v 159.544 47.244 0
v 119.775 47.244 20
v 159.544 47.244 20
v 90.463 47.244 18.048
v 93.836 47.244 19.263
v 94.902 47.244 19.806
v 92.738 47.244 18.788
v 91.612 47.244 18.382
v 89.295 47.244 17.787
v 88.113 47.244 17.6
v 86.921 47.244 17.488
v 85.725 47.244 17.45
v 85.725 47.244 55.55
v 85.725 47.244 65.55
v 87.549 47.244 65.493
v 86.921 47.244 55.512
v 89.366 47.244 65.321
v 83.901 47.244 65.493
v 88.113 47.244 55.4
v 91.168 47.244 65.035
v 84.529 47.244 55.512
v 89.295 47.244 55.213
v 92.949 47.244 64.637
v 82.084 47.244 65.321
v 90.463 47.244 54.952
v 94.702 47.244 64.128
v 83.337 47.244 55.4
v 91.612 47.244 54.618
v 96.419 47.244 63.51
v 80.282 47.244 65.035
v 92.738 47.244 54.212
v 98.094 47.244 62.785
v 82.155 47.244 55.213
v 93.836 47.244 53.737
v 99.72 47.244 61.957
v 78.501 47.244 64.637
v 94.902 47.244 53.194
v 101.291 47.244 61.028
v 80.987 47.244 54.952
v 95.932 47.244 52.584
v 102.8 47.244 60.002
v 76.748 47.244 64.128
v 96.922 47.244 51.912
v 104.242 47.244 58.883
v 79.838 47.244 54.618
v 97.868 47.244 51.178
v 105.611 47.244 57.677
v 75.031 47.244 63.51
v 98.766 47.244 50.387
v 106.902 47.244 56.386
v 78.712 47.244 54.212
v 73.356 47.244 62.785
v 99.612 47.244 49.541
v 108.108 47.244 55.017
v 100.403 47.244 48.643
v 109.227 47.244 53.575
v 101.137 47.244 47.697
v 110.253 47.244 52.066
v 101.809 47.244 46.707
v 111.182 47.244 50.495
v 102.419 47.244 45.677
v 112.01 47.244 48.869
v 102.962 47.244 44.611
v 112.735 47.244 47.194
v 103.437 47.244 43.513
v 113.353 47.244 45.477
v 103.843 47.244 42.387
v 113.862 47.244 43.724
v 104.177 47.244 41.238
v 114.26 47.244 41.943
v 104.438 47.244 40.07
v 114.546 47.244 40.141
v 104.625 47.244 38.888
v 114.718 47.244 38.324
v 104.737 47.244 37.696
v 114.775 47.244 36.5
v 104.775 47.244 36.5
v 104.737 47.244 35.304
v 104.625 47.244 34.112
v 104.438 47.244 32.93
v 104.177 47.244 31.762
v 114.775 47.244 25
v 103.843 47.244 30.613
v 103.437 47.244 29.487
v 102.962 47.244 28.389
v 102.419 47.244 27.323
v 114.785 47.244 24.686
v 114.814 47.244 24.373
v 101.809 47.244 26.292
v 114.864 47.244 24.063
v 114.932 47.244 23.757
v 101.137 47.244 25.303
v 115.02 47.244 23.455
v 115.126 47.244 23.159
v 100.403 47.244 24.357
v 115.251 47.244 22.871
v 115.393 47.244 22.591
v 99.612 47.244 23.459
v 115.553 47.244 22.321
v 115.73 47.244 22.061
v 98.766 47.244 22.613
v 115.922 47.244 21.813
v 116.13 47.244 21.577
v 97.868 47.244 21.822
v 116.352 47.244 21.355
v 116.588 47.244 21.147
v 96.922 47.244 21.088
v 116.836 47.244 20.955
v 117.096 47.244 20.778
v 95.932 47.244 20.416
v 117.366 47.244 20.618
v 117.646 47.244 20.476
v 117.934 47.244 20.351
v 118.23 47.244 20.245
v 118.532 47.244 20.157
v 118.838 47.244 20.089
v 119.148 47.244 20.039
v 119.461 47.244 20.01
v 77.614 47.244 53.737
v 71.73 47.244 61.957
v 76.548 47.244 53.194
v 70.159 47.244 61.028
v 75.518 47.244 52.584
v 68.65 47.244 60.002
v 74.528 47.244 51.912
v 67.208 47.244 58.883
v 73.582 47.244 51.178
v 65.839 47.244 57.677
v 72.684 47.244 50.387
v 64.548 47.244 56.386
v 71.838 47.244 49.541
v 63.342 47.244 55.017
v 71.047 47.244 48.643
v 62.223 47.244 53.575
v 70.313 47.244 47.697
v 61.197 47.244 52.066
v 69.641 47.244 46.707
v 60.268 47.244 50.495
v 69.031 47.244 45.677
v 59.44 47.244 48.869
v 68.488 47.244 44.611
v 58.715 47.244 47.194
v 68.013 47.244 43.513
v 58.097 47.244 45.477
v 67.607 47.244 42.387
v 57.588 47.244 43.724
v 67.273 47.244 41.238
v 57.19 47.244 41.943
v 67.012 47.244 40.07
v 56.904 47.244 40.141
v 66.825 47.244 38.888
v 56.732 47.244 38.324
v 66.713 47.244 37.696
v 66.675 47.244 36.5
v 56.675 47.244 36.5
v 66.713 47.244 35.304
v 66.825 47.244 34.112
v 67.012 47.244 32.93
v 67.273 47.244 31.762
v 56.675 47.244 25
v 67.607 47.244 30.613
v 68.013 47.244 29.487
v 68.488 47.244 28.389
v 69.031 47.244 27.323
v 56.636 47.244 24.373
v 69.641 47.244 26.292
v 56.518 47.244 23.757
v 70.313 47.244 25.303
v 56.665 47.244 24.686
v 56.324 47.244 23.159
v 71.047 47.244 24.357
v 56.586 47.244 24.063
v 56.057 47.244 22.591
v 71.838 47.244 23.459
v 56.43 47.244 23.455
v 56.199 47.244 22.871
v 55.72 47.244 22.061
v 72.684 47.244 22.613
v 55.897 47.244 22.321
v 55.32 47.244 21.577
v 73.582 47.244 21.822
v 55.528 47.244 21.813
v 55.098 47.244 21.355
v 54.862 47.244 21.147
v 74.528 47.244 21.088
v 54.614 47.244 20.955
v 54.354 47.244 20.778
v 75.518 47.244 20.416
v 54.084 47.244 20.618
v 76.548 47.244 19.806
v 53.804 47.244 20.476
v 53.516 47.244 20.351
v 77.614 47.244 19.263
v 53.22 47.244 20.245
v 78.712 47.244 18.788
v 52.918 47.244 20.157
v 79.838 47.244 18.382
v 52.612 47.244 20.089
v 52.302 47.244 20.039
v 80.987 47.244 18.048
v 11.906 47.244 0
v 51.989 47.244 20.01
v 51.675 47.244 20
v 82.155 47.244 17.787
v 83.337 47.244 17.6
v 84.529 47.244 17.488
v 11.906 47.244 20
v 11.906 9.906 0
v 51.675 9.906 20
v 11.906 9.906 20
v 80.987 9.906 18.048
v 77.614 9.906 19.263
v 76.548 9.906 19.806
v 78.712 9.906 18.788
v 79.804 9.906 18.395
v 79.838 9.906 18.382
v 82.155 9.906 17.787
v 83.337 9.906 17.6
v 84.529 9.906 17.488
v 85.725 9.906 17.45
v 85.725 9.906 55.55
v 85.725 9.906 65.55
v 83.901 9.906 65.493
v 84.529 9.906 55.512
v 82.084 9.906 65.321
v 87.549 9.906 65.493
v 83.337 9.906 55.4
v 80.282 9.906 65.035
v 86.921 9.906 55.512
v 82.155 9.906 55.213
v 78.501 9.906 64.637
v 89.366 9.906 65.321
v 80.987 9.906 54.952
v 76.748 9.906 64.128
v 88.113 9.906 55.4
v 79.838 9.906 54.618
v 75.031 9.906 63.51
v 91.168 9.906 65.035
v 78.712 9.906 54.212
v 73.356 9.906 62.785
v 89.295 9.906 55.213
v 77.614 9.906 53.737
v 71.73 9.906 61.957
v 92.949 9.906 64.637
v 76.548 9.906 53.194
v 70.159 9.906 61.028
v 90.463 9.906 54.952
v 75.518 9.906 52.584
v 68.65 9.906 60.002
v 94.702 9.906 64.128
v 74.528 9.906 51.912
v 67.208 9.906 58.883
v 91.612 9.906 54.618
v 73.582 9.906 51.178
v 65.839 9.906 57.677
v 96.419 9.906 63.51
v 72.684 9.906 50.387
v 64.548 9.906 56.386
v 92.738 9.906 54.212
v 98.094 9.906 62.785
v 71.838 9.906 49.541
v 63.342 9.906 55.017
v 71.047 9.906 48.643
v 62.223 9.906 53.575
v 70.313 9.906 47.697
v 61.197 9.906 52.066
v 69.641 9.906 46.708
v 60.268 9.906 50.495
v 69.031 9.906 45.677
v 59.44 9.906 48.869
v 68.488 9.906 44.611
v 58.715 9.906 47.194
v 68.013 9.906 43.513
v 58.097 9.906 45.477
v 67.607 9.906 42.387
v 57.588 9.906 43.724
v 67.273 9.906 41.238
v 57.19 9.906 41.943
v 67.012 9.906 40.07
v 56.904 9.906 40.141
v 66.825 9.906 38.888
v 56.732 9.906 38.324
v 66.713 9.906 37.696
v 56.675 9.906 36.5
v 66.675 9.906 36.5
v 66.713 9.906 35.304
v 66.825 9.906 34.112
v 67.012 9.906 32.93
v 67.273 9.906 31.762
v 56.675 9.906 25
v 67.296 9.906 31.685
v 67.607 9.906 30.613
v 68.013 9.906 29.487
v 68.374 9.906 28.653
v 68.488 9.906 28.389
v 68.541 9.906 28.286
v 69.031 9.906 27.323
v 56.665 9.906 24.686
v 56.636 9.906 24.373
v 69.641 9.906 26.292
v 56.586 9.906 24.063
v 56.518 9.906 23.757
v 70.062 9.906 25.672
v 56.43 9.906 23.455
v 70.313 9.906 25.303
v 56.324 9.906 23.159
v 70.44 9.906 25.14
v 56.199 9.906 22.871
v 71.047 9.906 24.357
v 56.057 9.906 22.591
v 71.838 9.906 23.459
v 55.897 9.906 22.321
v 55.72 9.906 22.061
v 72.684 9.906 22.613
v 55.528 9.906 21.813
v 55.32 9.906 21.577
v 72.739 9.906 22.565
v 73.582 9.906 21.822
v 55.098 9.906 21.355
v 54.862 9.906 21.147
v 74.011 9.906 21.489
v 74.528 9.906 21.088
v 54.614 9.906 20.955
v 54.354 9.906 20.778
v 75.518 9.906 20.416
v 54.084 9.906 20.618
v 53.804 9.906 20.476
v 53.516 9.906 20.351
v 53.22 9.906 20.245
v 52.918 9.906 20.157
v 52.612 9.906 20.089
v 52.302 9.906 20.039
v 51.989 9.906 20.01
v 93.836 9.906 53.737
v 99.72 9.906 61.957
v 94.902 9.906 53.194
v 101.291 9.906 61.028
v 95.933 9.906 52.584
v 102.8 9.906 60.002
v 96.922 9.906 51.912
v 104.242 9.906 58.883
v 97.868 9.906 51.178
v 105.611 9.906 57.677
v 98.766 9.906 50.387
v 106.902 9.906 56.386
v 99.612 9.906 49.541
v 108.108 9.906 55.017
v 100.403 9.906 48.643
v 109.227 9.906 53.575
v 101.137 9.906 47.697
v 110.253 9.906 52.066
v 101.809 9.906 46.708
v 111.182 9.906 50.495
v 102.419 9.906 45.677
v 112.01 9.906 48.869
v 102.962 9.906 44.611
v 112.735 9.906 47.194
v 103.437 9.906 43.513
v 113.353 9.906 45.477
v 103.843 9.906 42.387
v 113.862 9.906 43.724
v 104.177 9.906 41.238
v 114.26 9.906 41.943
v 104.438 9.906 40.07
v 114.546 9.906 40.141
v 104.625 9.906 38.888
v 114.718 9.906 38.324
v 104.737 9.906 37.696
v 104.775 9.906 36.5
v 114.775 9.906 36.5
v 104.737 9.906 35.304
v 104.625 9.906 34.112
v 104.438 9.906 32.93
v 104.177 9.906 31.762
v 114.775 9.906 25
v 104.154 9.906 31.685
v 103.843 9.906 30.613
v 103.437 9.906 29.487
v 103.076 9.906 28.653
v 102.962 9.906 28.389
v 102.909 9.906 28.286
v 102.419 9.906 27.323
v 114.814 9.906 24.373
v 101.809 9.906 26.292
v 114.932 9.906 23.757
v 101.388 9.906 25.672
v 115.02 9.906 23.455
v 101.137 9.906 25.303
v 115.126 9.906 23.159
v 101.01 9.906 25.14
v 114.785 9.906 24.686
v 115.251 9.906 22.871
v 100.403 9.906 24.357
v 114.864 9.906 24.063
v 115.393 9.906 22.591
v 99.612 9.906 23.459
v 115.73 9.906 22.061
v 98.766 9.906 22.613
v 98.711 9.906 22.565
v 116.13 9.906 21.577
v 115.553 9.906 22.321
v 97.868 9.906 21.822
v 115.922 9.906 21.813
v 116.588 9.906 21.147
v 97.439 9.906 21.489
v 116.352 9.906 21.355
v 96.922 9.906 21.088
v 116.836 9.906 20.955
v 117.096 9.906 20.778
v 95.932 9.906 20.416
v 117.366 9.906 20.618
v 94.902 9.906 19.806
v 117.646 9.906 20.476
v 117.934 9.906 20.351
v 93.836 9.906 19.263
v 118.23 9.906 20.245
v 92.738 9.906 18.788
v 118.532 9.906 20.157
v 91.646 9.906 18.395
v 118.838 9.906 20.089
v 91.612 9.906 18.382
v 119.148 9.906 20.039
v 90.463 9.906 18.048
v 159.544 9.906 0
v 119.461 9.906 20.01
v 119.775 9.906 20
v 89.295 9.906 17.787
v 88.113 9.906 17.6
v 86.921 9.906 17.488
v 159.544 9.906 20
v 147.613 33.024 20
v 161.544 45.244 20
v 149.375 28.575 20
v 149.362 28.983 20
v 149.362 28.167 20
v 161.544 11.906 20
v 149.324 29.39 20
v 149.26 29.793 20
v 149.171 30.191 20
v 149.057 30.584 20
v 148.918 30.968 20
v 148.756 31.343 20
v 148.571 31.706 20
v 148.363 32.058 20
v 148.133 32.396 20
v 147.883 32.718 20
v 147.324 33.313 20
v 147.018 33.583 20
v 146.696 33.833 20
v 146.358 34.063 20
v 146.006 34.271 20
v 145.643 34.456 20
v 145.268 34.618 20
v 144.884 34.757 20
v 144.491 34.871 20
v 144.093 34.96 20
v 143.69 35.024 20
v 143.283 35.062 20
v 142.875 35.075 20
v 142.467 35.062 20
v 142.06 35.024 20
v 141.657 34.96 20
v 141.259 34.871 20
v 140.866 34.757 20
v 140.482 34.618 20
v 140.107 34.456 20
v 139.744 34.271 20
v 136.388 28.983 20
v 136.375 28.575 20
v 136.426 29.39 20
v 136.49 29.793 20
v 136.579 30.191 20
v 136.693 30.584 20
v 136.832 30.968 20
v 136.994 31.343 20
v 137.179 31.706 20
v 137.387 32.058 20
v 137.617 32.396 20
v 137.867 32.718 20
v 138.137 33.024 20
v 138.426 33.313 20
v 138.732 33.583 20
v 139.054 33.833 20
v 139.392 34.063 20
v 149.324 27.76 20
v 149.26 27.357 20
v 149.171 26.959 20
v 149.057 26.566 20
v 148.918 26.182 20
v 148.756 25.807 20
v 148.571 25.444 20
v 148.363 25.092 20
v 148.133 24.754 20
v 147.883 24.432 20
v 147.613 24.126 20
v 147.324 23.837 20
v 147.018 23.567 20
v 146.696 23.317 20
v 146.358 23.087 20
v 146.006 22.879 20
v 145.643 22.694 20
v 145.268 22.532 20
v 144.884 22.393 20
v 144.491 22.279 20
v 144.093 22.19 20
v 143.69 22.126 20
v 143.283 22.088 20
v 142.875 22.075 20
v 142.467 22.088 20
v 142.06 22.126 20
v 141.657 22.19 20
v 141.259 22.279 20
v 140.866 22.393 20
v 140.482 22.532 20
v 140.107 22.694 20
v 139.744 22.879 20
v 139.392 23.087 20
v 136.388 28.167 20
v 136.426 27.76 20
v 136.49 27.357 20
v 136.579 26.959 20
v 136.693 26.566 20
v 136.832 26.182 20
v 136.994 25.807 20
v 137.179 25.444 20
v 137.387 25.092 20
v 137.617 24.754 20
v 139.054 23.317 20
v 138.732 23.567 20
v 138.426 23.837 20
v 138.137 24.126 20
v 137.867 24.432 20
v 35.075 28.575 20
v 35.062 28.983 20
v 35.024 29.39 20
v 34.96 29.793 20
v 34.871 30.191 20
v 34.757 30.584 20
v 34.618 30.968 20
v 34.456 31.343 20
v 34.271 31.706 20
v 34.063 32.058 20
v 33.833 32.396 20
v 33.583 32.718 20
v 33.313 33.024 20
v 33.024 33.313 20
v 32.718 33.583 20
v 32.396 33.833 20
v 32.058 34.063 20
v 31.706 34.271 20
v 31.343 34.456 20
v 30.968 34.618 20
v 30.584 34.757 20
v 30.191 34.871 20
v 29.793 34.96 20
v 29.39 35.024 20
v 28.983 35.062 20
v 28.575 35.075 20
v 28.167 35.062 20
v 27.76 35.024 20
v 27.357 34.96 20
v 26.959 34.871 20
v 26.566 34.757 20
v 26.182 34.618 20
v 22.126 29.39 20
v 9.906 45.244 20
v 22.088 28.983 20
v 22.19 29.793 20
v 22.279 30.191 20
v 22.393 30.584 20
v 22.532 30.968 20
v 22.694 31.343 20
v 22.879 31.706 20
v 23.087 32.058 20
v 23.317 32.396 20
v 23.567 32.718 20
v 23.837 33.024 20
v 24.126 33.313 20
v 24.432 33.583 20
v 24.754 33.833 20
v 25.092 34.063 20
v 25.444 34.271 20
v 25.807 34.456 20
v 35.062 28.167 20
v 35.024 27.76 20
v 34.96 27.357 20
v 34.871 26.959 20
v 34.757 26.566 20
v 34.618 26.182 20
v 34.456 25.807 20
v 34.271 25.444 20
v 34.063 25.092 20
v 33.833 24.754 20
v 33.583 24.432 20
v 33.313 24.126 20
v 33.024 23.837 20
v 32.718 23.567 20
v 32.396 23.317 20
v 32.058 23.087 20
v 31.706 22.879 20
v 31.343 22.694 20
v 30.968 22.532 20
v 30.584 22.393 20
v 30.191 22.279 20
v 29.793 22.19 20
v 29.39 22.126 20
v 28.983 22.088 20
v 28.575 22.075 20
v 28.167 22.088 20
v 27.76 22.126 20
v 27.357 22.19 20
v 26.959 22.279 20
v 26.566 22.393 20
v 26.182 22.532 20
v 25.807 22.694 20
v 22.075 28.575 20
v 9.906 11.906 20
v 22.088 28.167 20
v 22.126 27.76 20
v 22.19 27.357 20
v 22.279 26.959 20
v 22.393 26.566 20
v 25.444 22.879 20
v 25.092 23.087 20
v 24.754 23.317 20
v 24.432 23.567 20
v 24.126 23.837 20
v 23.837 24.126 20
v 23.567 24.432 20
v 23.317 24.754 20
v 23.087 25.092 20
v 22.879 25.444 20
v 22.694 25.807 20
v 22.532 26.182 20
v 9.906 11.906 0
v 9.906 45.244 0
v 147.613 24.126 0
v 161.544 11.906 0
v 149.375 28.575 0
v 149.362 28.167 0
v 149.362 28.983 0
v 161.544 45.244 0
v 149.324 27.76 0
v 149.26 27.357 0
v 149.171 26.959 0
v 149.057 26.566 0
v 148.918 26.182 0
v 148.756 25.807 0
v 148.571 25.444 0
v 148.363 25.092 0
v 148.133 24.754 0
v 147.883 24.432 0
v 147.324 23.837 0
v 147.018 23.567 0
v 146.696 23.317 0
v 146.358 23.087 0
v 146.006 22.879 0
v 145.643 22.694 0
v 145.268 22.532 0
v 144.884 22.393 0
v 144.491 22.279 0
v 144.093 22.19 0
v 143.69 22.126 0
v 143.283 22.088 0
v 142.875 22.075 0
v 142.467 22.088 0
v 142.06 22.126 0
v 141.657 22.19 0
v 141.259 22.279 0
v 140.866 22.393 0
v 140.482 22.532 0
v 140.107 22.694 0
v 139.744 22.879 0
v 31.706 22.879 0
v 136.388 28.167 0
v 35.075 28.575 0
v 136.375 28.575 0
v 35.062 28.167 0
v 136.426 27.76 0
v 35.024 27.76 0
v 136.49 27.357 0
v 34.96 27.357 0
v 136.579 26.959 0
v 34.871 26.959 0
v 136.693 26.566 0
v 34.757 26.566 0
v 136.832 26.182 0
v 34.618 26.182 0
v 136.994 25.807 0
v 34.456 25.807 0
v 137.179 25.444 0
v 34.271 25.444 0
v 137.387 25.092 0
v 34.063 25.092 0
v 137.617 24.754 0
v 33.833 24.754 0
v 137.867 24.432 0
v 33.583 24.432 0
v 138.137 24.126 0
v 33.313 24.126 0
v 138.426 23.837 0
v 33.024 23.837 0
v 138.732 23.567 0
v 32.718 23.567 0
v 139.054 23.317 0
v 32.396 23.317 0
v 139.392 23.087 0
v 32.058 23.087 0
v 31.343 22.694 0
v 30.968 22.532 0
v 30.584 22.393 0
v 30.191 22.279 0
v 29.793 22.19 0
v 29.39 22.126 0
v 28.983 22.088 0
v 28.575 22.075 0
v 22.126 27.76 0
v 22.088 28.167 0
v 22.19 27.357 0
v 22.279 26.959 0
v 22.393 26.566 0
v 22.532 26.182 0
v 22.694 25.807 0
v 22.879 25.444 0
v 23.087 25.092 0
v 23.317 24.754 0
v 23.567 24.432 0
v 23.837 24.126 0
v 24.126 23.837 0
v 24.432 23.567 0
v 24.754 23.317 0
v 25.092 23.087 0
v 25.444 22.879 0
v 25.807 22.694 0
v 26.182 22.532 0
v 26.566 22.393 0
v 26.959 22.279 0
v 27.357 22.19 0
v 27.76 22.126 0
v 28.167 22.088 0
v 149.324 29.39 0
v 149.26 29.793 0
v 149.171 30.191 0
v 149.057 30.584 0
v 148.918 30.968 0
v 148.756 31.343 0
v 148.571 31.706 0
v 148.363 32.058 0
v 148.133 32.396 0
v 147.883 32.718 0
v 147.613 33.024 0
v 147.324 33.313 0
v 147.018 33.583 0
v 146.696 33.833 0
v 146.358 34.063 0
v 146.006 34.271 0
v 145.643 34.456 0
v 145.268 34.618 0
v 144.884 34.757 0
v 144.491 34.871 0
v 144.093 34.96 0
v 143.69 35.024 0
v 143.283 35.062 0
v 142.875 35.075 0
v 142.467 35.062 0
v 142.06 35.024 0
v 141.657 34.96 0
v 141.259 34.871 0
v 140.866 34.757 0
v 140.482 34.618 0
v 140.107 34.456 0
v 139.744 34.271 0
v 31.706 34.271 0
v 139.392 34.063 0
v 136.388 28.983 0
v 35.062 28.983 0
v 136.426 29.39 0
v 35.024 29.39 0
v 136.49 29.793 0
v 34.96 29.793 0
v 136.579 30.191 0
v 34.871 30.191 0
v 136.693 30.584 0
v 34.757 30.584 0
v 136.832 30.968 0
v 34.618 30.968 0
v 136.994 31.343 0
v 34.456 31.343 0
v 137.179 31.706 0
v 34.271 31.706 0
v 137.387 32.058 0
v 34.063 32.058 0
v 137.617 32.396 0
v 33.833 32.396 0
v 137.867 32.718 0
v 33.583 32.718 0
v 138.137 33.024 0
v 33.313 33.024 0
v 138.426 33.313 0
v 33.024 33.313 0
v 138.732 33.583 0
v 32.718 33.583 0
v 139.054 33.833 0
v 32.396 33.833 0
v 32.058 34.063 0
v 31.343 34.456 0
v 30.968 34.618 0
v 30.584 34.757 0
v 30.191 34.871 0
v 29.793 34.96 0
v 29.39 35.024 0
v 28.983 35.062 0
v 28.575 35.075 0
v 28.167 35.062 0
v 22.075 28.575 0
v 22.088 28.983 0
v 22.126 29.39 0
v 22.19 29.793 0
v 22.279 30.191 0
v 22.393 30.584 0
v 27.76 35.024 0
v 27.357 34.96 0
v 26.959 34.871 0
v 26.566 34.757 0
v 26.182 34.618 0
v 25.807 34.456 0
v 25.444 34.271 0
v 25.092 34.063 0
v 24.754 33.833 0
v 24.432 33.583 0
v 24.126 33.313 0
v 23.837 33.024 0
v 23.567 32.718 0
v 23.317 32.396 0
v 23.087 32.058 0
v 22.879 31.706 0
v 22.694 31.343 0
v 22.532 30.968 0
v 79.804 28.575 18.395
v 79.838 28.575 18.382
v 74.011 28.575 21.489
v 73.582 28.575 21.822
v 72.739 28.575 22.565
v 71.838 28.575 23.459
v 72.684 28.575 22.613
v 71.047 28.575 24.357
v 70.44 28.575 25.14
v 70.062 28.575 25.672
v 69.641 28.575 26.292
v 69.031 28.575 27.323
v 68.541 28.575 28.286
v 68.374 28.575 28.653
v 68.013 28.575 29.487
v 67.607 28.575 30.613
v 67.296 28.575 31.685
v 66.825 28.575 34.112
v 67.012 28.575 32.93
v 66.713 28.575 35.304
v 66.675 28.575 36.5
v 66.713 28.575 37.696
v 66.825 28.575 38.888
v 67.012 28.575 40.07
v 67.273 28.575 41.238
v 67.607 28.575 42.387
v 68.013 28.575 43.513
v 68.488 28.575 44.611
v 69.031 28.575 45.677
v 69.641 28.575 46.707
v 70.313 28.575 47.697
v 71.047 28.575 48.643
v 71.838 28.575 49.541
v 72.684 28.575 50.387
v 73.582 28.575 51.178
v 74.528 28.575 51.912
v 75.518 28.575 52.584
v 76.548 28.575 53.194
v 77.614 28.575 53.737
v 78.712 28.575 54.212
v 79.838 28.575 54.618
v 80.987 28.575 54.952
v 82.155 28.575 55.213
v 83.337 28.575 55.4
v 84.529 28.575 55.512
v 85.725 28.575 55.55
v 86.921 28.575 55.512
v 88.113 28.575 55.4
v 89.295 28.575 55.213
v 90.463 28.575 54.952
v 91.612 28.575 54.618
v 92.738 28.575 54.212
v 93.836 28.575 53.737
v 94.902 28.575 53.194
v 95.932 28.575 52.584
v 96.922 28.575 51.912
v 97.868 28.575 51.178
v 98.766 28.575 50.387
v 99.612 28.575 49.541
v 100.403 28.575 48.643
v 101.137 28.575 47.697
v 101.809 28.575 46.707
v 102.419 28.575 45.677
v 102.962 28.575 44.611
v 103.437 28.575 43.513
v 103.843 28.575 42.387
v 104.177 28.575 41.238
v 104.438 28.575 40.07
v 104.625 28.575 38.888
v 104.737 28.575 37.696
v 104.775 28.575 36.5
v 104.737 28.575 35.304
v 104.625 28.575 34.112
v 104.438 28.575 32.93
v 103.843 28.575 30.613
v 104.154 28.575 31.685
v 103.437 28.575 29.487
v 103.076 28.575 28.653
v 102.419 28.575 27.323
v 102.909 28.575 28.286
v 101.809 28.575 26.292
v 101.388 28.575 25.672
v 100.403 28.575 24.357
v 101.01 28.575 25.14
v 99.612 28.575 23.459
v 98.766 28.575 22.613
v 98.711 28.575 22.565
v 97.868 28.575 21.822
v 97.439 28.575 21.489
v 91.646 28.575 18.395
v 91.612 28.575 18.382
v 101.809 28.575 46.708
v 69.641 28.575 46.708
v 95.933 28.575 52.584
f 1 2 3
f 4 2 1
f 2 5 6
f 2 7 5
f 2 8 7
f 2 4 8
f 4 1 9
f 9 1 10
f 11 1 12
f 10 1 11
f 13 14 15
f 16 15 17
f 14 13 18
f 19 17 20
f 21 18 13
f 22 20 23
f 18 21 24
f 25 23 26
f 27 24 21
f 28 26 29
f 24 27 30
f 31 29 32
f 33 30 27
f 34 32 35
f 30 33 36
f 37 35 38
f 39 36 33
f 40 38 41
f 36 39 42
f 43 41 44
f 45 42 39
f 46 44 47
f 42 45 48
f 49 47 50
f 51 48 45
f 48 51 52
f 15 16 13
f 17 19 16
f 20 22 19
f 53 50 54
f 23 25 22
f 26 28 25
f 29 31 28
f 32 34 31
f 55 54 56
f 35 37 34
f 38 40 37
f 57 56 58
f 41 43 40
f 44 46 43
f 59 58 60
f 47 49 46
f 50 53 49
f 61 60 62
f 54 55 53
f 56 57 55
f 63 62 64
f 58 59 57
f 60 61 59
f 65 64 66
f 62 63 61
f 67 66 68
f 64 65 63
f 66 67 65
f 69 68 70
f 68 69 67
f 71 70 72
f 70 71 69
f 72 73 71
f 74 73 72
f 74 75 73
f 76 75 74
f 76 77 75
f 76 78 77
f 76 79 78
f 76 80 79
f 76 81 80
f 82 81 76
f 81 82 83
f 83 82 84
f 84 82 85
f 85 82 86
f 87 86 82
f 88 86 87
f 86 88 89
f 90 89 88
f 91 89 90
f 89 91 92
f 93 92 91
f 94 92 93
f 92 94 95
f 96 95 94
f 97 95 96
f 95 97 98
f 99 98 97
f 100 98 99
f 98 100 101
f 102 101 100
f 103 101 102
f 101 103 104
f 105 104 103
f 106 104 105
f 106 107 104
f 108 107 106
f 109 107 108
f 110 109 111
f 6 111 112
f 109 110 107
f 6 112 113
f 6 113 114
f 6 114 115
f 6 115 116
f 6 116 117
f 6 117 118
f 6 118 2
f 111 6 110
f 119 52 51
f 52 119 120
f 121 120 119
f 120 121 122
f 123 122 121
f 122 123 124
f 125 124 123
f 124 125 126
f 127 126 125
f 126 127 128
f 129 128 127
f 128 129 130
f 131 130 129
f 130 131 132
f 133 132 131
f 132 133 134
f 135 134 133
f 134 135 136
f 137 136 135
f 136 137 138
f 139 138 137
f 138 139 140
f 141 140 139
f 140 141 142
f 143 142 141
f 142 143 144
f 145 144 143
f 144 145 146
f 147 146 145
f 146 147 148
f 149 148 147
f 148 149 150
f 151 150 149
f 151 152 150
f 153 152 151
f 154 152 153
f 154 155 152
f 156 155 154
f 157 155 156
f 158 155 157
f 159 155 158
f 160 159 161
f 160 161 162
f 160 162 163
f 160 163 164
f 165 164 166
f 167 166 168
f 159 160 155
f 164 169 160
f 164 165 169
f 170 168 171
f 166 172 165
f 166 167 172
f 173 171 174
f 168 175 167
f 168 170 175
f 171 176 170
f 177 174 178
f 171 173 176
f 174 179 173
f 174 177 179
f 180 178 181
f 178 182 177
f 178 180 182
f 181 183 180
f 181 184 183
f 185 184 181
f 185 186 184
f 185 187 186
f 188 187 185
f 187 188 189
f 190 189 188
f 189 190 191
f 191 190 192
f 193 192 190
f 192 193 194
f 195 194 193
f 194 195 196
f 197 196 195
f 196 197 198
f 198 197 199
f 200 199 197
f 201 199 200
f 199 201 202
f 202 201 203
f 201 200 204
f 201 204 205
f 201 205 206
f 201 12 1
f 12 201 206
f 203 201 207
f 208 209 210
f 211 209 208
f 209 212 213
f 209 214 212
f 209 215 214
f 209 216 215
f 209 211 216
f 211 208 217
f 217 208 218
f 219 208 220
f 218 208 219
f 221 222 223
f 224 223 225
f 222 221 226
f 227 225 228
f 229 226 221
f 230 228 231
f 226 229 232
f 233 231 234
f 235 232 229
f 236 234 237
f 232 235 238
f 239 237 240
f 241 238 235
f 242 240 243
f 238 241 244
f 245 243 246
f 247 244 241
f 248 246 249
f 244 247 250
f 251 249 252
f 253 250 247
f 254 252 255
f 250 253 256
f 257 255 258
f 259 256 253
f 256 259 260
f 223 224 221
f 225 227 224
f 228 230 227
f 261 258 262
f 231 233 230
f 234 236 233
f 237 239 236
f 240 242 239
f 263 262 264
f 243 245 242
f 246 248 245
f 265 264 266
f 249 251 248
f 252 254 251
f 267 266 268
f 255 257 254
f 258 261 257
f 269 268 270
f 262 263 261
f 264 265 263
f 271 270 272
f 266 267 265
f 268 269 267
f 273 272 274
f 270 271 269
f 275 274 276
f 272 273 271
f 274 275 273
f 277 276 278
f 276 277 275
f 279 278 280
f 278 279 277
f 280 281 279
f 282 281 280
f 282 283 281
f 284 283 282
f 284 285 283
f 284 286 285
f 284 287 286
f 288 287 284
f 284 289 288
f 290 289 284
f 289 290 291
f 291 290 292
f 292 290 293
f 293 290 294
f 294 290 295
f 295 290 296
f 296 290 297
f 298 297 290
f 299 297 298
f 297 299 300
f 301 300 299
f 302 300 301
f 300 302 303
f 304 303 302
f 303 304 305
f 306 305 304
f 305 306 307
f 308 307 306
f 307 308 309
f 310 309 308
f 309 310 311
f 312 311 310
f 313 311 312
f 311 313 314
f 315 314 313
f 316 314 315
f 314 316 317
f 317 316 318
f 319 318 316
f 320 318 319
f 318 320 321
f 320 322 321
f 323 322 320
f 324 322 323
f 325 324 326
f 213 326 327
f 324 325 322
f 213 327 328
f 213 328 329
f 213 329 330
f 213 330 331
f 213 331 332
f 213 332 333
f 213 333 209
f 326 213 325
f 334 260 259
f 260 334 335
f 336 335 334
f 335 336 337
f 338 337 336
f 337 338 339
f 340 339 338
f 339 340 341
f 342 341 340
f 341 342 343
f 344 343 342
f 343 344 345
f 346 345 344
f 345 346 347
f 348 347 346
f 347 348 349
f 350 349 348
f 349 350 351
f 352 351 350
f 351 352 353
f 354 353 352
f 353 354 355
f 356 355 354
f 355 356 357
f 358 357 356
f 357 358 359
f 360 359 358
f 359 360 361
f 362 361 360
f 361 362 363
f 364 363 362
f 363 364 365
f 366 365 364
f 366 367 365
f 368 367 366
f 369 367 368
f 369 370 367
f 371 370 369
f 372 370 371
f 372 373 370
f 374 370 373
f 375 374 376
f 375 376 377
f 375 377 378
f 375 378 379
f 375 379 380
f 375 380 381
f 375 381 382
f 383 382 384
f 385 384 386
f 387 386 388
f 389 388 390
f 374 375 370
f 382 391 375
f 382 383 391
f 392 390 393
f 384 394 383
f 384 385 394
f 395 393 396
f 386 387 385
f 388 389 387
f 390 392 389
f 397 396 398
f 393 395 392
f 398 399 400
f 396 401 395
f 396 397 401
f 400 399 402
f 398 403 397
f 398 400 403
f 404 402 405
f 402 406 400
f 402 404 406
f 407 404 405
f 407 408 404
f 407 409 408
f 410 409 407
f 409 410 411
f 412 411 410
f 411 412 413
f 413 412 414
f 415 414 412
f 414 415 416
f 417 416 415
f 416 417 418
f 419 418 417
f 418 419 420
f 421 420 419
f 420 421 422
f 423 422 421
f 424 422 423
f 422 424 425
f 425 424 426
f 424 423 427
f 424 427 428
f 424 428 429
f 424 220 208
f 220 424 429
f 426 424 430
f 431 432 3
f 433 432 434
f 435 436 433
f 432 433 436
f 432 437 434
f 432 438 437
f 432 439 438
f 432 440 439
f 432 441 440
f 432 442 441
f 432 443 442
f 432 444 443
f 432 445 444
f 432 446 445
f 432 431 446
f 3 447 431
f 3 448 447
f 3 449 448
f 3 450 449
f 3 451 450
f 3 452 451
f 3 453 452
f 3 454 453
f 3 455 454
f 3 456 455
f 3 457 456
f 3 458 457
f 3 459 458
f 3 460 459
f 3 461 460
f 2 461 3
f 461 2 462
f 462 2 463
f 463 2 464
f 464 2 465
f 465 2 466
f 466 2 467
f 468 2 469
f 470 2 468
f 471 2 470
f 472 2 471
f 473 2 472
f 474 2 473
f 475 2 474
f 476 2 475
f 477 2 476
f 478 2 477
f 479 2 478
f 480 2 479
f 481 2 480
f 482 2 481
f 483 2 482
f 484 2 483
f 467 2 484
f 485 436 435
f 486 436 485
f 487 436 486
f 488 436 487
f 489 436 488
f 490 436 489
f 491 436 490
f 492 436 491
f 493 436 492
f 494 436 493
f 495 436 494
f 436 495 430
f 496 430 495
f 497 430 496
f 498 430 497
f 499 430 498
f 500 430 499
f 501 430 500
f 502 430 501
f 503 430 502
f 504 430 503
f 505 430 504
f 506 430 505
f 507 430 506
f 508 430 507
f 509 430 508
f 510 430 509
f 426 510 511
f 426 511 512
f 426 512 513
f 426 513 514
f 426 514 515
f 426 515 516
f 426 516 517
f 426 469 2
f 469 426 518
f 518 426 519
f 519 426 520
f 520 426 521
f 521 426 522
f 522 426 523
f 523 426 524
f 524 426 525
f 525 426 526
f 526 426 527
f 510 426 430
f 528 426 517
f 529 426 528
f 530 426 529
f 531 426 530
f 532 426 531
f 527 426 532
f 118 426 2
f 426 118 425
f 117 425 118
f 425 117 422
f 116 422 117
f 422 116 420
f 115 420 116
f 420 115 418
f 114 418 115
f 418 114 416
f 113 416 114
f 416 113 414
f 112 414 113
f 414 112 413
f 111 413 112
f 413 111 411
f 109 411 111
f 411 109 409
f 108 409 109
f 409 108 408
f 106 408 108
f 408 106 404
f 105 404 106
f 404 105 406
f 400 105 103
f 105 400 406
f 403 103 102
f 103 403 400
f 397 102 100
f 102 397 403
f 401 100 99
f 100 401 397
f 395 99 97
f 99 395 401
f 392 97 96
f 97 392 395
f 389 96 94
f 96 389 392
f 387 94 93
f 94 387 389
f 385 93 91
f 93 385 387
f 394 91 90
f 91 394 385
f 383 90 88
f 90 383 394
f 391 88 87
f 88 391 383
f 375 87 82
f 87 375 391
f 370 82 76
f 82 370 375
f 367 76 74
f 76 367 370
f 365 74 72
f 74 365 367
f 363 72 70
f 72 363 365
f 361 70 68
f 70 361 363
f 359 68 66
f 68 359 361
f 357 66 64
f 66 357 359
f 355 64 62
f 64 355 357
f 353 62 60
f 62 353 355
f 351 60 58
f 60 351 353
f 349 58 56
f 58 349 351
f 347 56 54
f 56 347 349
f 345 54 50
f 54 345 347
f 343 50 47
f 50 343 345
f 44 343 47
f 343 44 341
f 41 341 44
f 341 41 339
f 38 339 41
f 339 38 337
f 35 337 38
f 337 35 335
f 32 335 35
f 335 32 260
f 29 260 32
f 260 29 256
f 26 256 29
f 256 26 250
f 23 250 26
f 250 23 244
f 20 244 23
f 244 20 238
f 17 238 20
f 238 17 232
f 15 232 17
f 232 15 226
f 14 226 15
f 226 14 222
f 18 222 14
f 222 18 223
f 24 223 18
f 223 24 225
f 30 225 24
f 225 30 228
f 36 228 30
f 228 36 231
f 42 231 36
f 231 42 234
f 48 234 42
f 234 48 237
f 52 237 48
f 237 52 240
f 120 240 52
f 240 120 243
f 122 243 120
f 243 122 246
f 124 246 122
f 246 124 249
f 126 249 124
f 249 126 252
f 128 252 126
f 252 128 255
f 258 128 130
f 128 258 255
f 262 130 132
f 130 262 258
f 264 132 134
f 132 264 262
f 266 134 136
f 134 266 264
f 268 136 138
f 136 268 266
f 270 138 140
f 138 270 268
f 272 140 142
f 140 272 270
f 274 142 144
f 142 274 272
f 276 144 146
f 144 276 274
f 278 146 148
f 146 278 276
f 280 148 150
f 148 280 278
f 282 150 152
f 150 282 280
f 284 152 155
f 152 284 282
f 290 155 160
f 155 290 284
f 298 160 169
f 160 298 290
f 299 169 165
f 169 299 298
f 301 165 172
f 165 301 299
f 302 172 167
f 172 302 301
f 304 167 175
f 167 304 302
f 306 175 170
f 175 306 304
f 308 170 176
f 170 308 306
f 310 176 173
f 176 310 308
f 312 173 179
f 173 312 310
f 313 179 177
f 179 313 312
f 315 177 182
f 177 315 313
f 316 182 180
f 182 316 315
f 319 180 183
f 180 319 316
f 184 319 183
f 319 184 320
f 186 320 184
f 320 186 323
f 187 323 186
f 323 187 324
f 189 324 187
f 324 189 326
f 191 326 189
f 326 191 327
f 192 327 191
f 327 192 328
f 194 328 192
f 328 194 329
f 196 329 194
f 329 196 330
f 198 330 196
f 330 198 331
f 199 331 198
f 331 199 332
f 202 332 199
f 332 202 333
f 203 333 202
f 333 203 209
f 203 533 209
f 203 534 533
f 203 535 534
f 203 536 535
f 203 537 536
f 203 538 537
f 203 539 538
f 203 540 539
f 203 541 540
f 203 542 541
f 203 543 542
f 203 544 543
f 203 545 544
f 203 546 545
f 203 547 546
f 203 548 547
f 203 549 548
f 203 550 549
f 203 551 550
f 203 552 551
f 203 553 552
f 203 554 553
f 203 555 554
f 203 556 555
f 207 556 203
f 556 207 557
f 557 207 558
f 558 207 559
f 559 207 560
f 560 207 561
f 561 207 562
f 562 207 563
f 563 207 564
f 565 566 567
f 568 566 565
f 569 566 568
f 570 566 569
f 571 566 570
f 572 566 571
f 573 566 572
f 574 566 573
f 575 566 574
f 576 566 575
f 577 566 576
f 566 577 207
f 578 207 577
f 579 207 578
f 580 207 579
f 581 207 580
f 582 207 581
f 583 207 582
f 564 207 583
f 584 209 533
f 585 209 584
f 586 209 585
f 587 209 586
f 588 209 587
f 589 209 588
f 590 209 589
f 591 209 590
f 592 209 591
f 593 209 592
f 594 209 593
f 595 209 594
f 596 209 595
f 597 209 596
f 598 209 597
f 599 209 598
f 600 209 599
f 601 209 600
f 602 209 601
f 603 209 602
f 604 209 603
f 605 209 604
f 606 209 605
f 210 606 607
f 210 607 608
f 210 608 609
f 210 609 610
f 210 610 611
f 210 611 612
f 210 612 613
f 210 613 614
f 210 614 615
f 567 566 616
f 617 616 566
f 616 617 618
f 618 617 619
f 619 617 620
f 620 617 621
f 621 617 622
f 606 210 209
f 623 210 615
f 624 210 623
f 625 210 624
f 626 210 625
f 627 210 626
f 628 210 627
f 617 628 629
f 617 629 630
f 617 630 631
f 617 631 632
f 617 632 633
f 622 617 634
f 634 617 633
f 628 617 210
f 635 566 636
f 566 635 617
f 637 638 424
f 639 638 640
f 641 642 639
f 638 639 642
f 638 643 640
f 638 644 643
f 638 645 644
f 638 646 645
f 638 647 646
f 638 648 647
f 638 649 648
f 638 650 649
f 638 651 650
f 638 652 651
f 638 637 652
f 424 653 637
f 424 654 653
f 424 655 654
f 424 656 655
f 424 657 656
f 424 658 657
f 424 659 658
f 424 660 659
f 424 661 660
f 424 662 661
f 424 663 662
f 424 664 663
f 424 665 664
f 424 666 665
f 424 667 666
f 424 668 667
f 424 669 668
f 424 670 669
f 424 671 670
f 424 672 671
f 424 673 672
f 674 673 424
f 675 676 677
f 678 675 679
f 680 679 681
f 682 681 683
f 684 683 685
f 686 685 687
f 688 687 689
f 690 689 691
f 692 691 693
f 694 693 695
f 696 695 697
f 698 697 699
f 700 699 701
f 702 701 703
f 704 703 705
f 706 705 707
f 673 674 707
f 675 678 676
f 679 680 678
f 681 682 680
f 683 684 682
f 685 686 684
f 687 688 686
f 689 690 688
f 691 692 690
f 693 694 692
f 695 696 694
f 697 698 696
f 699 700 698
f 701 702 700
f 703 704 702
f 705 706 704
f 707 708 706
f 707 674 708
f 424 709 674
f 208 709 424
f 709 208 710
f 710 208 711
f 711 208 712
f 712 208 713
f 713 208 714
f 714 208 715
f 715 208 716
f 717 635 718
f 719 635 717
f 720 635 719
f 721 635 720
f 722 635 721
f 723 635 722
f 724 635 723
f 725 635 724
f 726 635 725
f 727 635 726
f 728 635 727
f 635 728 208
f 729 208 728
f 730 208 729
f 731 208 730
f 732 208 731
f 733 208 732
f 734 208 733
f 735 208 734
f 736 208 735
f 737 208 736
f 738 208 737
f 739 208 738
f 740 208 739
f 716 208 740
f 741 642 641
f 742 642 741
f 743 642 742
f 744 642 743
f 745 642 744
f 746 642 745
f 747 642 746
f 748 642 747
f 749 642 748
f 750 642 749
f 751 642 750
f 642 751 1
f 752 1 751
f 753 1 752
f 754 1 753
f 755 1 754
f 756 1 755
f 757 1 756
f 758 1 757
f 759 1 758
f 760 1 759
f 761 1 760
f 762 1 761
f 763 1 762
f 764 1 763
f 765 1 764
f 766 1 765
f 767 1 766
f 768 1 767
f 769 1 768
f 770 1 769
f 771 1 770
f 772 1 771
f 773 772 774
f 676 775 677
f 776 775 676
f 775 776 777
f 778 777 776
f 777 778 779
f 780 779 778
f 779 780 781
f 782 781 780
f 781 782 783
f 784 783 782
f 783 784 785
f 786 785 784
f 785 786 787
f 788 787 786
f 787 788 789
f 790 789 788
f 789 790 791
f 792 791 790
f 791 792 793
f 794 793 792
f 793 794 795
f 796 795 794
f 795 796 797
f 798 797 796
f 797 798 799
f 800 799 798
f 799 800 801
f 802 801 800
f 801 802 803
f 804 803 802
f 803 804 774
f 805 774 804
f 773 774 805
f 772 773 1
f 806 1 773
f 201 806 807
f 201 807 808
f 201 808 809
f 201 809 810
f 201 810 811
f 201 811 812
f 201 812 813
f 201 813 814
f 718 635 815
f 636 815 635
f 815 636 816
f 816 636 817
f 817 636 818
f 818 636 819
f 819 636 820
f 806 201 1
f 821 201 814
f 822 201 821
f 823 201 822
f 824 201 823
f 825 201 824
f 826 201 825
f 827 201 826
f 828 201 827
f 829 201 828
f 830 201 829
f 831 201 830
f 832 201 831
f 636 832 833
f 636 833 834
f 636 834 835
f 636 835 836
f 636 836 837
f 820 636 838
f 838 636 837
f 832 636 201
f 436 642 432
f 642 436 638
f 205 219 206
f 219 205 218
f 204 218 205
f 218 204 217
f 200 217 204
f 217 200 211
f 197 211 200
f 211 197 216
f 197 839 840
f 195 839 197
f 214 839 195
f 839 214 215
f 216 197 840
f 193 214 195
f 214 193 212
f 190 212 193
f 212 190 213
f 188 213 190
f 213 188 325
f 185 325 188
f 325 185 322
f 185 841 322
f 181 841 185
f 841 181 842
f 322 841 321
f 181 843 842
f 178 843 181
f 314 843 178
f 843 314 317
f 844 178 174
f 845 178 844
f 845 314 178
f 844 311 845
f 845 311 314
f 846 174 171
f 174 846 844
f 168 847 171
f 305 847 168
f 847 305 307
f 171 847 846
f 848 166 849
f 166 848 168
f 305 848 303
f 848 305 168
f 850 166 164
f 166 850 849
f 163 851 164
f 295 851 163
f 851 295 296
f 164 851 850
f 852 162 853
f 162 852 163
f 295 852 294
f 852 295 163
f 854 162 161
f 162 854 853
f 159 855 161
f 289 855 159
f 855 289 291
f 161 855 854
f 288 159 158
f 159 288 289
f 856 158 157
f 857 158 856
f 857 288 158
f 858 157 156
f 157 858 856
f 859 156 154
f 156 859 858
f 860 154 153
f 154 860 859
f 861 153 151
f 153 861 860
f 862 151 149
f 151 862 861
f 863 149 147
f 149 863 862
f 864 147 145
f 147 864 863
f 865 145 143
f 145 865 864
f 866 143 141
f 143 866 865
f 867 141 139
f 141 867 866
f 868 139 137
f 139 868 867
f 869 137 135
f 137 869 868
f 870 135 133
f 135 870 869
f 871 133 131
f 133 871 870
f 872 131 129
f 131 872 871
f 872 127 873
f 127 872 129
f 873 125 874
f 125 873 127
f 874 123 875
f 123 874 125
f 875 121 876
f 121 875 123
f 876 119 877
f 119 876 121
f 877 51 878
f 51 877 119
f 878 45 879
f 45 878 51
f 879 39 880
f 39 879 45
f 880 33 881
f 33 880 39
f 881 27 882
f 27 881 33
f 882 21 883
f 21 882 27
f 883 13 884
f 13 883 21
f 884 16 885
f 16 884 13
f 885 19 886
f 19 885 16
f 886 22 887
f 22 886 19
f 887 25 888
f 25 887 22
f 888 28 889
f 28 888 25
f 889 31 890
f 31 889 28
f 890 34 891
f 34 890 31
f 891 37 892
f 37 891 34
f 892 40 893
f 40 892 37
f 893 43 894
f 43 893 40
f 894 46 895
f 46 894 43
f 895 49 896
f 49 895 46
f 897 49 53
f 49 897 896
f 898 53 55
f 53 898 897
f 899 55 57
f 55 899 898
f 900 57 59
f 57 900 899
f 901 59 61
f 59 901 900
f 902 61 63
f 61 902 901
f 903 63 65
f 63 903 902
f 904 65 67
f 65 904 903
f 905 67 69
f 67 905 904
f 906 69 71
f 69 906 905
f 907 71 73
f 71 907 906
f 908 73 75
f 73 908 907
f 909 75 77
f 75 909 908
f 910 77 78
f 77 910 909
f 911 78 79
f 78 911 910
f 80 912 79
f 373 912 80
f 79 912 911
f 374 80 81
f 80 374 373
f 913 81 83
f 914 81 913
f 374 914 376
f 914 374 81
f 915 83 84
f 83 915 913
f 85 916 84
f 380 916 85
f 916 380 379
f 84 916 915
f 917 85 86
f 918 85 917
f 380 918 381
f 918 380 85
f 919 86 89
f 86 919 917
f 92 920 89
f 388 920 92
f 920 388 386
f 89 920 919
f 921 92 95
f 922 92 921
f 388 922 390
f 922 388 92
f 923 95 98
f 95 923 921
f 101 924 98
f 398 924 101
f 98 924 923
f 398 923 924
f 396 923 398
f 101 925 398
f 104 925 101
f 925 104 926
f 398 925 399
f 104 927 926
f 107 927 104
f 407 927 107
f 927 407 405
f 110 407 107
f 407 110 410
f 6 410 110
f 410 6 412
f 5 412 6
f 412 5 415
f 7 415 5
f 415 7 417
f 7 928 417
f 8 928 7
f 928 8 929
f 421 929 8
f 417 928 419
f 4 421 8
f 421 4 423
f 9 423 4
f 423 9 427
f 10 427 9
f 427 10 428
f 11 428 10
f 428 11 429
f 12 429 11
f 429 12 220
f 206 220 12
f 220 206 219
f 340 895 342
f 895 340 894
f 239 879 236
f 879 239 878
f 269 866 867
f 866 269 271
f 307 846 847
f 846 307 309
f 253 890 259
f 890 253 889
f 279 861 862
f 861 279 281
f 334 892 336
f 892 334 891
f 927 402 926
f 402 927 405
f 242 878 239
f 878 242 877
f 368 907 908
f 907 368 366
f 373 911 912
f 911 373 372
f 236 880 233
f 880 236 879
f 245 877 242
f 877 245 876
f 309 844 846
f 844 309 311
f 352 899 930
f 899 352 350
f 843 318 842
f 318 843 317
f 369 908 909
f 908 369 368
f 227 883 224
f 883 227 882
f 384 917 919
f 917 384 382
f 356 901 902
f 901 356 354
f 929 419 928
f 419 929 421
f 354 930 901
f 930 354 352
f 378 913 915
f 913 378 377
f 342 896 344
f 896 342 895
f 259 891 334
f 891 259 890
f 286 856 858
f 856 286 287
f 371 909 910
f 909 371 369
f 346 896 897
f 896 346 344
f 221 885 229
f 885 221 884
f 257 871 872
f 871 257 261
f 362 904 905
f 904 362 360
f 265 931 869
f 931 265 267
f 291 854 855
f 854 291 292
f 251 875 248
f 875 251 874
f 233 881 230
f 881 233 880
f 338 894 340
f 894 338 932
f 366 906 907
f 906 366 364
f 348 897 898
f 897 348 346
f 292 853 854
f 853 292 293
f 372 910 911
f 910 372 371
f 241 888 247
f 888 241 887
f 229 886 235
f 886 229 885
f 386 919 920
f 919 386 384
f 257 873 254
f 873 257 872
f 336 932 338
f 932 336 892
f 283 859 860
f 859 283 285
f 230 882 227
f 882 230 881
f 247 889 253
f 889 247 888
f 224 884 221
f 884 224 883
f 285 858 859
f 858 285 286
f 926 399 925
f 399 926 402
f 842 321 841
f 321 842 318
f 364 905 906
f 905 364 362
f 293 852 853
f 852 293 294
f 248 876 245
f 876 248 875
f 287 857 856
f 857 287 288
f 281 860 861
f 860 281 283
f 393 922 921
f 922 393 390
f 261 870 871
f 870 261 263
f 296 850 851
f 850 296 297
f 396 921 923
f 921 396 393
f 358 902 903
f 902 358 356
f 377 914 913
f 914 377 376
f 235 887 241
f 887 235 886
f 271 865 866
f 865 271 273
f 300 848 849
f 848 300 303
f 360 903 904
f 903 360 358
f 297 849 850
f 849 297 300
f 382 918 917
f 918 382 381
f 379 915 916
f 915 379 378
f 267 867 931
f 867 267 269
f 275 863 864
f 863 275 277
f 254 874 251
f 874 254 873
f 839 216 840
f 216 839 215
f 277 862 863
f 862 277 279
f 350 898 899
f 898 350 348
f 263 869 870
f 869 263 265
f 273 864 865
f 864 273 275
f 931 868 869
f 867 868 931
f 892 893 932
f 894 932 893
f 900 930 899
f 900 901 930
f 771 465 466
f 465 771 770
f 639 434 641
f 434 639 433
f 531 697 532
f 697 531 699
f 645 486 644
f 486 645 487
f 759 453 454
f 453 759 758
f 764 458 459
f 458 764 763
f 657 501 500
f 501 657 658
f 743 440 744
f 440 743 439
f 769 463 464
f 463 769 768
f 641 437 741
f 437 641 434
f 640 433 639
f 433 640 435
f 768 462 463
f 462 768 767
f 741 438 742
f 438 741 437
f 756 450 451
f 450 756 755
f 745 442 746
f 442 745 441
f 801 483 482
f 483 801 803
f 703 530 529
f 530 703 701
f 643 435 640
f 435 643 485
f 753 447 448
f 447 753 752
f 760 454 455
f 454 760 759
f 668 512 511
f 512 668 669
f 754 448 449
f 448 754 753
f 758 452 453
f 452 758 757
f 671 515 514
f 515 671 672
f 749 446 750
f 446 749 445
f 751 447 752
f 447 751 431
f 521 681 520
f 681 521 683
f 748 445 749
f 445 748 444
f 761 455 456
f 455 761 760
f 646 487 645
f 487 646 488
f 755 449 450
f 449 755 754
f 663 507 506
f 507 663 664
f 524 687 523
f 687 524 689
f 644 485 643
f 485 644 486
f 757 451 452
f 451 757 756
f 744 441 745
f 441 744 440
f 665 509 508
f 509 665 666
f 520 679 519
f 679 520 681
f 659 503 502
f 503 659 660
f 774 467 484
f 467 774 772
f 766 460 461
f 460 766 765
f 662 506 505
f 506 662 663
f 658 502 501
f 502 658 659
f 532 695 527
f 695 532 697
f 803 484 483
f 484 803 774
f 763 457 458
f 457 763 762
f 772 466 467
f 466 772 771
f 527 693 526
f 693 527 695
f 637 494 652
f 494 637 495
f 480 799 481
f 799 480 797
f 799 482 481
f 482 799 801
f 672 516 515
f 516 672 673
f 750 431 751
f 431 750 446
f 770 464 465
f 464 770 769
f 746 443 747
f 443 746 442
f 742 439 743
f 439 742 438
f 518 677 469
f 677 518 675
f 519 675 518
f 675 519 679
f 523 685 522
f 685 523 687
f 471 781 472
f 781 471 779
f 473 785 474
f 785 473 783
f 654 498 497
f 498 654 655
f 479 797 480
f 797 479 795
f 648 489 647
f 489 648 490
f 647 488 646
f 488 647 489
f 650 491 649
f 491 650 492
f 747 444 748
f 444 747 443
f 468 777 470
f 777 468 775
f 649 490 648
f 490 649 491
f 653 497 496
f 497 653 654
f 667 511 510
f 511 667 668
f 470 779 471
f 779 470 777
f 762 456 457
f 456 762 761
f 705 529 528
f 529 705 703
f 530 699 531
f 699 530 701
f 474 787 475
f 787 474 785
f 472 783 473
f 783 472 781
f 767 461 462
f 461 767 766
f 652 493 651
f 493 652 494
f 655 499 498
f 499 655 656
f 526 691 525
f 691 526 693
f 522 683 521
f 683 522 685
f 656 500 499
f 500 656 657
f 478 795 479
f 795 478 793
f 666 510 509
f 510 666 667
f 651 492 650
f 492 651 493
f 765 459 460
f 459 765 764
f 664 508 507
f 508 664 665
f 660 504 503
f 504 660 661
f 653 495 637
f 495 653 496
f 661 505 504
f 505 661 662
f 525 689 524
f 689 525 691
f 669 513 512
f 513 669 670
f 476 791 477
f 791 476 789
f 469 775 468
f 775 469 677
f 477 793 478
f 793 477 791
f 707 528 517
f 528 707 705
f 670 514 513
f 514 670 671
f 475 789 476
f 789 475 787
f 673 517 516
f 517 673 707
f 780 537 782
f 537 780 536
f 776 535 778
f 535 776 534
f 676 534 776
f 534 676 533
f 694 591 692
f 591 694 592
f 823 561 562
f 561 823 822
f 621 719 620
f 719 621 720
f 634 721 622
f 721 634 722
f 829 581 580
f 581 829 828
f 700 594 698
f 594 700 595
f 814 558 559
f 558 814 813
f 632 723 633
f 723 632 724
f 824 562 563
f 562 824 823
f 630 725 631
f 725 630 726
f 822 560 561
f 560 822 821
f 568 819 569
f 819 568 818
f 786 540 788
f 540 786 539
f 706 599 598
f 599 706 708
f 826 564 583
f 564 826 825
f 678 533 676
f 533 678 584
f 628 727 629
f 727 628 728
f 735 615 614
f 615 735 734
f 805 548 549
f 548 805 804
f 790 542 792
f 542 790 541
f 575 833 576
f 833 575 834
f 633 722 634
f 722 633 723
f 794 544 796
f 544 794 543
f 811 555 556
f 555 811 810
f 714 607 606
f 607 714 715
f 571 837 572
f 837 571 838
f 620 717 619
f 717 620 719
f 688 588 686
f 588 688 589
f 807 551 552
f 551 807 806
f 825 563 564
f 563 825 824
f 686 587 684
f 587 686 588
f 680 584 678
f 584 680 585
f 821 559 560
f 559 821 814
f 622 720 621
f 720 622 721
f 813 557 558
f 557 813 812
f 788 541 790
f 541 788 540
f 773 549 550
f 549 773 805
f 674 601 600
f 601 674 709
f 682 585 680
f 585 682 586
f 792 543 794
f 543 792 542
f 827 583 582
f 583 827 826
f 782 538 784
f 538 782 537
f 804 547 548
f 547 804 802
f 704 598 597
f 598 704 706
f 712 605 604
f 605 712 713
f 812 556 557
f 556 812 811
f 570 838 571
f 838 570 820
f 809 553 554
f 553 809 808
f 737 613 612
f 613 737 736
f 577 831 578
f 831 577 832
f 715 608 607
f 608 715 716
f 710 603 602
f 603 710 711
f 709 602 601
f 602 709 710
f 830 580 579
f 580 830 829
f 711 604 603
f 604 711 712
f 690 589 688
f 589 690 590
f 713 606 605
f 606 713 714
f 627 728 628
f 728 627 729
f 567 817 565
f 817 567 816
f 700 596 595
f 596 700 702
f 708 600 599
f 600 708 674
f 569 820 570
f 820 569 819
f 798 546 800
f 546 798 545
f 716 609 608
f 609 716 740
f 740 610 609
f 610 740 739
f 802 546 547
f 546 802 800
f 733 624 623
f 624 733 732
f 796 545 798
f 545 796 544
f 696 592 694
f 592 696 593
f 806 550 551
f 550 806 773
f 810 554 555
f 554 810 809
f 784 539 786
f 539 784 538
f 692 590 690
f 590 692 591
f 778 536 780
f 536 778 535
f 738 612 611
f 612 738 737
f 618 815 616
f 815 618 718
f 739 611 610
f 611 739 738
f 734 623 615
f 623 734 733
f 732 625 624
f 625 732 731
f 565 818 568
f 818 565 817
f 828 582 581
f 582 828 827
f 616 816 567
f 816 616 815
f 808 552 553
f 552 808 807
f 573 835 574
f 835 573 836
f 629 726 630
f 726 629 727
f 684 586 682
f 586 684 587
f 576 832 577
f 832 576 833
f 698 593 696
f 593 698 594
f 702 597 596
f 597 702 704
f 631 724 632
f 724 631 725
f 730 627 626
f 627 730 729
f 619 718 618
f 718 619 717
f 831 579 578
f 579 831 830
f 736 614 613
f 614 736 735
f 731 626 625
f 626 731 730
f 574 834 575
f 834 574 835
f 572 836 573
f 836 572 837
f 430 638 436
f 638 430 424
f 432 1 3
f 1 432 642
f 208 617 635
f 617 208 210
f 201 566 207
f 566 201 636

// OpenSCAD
// in mm	(include tolerance for printing)
bearing_outer_diameter = 38.1; 
// center axis of bearing to mounting surface
bearing_center_height = 36.5; 

// in mm (for openbeam, 15 or 14)
bearing_block_thickness = 1.47*25.4; 
// mm of material around bearing (wall thickness)
bearing_OD_pillowblock_thickness = 10; 

// diameter of the mounting bolt holes 	(for openbeam, 3.2)
mounting_hole_diameter=0.5118*25.4; 
// distance between mounting holes 		(for openbeam, 30)
mounting_hole_spacing = 38.1*3;
//Diameter of bolt head (for openbeam, 6.5)
countersink_diameter = 0;	
// Countersink until this thickness is remaining (for openbeam, 2)
countersink_thickness = 18;	

// Diameter of set screws holes on the sides (0 to remove)
set_screw_diameter = 0;

// thickness of base of pillow block
base_thickness = 20;	
//fillet between base and bearing
base_fillet_radius = 5;	
// the four clipped corners
base_chamfer_size = 2;		

// lip intrusion into bearing holder
lip_size = 0; 
// lip thickness for holding the bearing in place
lip_thickness = 0; 

r=bearing_outer_diameter/2 + bearing_OD_pillowblock_thickness;  // outer radii, this should be calculated based on the desired hole size


$fn = 100;

//Center on frame
translate([38.1*2.25,0.75*38.1,0])
rotate([90,0,0])

difference()
{
	difference()
	{
		union()
		{
			linear_extrude(height=bearing_block_thickness, center=true, convexity=10, twist=0)
			{
				difference()
				{
					union()
					{
						translate([0,base_thickness/2]) 						// base
							square([mounting_hole_spacing+bearing_block_thickness,base_thickness], center=true);
						translate([0,bearing_center_height])					// main bearing block
							circle(r=r);											
				   		translate([0,bearing_center_height/2]) 
							square([2*r,bearing_center_height], center=true);  // fillet to main bearing block
				 	  	translate([0,base_thickness+(base_fillet_radius/2)]) 
							square([2*r+(2*base_fillet_radius),base_fillet_radius], center=true); // fillet to base
					}
					translate([r+base_fillet_radius,base_fillet_radius+base_thickness])
						circle(r=base_fillet_radius);							// fillet 1
					translate([-(r+base_fillet_radius),base_fillet_radius+base_thickness])
						circle(r=base_fillet_radius);							// fillet 2
					translate([0,bearing_center_height])
						circle(r=bearing_outer_diameter/2);					// main bearing hole
					translate([0,-base_thickness/2]) 							// area below the base (cleanup)
						square([mounting_hole_spacing+15,base_thickness], center=true);
				}
			}
			// the lip
			translate([0,bearing_center_height, (bearing_block_thickness/2)-lip_thickness]) 
				cylinder(r=(bearing_outer_diameter/2)*1.1,h=lip_thickness);
		}
		// hole in the lip
		translate([0,bearing_center_height,0]) 
			cylinder(r=(bearing_outer_diameter/2)-lip_size,h=bearing_block_thickness*2);
	}
	union()
	{
		// Mounting Holes
		translate([mounting_hole_spacing/2,-1,0]) 
			rotate([-90,0,0]) 
				cylinder(r=mounting_hole_diameter/2,h=base_thickness+2);
		translate([mounting_hole_spacing/-2,-1,0]) 
			rotate([-90,0,0])
				cylinder(r=mounting_hole_diameter/2,h=base_thickness+2);
		// Countersink
		translate([mounting_hole_spacing/2,countersink_thickness,0])
			rotate([-90,0,0])
				cylinder(r=countersink_diameter/2,h=bearing_center_height*2);
		translate([mounting_hole_spacing/-2,countersink_thickness,0])
			rotate([-90,0,0])
				cylinder(r=countersink_diameter/2,h=bearing_center_height*2);
	}
	union()
	{
		//Base Chamfers
		translate([(mounting_hole_spacing+bearing_block_thickness)/2,base_thickness/2,bearing_block_thickness/2])
			rotate([0,45,0])
				cube([base_chamfer_size/sin(45),base_thickness*1.1,base_chamfer_size/sin(45)], center=true);
		translate([(mounting_hole_spacing+bearing_block_thickness)/2,base_thickness/2,bearing_block_thickness/-2])
			rotate([0,45,0])
				cube([base_chamfer_size/sin(45),base_thickness*2,base_chamfer_size/sin(45)], center=true);
		translate([(mounting_hole_spacing+bearing_block_thickness)/-2,base_thickness/2,bearing_block_thickness/2])
			rotate([0,45,0])
				cube([base_chamfer_size/sin(45),base_thickness*2,base_chamfer_size/sin(45)], center=true);
		translate([(mounting_hole_spacing+bearing_block_thickness)/-2,base_thickness/2,bearing_block_thickness/-2])
			rotate([0,45,0])
				cube([base_chamfer_size/sin(45),base_thickness*2,base_chamfer_size/sin(45)], center=true);

	}
	union()
	{
		//Set screws
		translate([-bearing_OD_pillowblock_thickness - (bearing_outer_diameter),bearing_center_height,-lip_size/2])
			rotate([0,90,0])
				cylinder(h=(bearing_outer_diameter+bearing_OD_pillowblock_thickness)*2, r=set_screw_diameter/2);
	}
}
